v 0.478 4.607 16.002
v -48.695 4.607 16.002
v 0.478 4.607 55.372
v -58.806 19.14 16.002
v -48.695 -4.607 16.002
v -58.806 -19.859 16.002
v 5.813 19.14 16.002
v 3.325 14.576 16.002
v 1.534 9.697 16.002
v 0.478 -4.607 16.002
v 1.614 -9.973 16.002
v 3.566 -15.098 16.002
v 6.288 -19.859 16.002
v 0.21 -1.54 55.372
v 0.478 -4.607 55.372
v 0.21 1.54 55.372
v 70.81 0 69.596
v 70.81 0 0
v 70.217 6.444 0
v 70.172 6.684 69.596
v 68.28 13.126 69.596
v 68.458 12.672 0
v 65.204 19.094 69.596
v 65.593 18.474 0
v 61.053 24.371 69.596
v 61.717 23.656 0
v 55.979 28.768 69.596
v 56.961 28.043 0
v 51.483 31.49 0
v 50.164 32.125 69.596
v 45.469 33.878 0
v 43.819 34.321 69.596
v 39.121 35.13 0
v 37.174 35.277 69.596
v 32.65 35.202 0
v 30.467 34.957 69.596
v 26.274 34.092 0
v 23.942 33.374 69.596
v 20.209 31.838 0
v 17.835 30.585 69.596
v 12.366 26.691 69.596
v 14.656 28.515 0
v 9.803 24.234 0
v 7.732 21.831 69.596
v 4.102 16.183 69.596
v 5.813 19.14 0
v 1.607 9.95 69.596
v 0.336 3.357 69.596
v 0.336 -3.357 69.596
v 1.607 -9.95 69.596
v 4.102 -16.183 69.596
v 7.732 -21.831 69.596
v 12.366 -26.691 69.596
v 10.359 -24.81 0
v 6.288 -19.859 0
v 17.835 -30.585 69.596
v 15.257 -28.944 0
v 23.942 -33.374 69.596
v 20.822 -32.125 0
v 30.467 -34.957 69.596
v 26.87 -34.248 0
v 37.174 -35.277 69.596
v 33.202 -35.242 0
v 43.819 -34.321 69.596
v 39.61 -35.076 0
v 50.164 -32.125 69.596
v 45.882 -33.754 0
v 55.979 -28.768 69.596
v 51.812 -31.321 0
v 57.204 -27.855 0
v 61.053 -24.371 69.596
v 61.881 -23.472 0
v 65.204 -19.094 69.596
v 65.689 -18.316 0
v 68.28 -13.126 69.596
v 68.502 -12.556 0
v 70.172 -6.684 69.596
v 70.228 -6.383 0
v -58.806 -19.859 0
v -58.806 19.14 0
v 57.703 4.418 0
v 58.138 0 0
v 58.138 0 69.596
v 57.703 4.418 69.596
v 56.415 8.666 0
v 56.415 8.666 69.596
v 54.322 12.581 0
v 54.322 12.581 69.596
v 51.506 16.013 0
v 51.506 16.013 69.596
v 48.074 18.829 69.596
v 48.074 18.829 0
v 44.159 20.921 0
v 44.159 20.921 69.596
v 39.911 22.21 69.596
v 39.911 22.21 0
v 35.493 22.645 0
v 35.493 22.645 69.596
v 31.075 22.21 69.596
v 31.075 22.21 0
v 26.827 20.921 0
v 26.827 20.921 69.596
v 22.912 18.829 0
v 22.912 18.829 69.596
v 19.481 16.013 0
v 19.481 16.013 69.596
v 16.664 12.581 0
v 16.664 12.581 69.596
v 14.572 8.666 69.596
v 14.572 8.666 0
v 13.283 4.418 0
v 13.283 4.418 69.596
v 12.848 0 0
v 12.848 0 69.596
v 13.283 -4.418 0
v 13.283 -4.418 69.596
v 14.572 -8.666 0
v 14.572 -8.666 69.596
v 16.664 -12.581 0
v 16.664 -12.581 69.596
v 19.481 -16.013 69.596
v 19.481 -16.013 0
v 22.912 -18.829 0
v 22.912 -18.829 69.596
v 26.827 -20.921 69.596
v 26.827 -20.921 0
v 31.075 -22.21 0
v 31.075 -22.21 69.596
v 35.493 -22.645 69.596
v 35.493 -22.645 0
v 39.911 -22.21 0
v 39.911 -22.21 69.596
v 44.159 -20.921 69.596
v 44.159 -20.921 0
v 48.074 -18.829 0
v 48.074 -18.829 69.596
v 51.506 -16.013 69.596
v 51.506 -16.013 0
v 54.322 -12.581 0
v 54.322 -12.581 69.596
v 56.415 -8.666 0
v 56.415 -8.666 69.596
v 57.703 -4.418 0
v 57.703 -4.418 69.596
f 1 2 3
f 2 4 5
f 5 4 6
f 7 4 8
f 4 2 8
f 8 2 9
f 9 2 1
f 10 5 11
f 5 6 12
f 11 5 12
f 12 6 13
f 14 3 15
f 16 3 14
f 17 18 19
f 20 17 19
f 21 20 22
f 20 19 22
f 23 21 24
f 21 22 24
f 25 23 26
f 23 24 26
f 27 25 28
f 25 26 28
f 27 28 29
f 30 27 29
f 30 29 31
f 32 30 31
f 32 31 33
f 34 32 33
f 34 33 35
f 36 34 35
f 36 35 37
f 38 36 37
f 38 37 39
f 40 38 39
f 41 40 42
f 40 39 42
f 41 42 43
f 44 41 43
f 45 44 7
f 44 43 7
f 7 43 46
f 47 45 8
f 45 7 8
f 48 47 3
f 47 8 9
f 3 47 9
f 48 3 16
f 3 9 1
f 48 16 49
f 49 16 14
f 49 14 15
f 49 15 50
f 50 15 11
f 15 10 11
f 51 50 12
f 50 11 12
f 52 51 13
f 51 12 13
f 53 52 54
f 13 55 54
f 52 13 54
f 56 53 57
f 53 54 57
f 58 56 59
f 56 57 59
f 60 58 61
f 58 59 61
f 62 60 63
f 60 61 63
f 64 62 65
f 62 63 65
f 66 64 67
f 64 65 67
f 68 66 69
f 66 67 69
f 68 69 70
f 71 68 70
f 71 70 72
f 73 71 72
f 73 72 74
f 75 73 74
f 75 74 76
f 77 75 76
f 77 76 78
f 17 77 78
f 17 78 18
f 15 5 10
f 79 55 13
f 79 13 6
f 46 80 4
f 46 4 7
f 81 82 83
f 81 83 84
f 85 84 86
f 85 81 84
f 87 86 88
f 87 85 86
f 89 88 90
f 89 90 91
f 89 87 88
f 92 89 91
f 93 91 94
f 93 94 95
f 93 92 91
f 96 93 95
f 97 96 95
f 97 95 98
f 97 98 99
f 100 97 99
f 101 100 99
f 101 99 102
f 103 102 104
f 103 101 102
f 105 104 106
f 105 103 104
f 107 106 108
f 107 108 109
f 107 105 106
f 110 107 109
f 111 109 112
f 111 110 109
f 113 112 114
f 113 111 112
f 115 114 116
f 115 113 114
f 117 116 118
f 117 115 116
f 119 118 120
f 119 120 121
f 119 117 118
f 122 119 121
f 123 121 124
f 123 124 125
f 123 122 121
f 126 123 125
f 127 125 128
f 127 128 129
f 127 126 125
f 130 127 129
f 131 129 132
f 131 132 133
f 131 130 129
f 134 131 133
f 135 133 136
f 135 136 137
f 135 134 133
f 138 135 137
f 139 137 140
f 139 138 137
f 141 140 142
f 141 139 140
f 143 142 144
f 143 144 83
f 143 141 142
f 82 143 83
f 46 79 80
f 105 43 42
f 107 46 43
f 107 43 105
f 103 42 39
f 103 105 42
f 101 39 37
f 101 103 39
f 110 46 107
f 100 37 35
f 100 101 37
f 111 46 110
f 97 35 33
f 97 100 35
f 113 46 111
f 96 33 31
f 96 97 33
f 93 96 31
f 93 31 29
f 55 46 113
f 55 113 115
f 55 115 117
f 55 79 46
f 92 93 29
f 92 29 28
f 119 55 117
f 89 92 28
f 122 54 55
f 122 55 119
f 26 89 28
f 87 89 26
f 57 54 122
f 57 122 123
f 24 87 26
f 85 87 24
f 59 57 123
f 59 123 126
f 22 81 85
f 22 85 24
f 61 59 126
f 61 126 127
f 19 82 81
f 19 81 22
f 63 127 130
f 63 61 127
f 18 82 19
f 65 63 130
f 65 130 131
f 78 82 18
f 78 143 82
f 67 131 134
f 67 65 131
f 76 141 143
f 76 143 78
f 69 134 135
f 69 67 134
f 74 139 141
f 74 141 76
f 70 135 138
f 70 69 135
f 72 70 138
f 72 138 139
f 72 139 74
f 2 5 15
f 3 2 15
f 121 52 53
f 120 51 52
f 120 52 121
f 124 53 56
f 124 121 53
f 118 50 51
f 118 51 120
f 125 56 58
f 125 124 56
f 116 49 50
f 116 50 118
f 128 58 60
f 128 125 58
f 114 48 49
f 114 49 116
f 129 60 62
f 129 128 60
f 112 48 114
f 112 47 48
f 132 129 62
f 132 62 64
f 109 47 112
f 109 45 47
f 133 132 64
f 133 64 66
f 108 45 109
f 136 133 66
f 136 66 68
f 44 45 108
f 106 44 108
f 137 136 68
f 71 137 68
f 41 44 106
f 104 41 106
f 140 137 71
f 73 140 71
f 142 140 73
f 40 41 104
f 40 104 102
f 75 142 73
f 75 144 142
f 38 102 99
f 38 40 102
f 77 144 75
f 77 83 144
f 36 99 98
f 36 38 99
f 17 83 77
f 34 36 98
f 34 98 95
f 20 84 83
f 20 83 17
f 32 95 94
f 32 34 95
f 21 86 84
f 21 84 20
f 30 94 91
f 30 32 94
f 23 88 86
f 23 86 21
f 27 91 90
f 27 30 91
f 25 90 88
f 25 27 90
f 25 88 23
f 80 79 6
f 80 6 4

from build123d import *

# Parameters (mm, degrees)
F0_R     = 35.316834
F0_R_2   = 22.645268
F1_DEPTH = 69.596
F3_DEPTH = 16.002
F4_W     = 31.616599
F4_H     = 9.21494
F5_DEPTH = 55.372
F6_W     = 26.249159
F6_H     = 9.21494
F7_DEPTH = 39.37
F9_DEPTH = 38.1


with BuildPart() as f1:
    # F0 (on Top) → F1 (new body)
    with BuildSketch(Plane.XY):
        with Locations((35.493162, 0)):
            Circle(F0_R)
        with Locations((35.493162, 0)):
            Circle(F0_R_2, mode=Mode.SUBTRACT)
    extrude(amount=F1_DEPTH)

    # F2 (on face) → F3 (join)
    with BuildSketch(Plane(origin=(0, 0, 0), x_dir=(1, 0, 0), z_dir=(0, 0, -1))):
        with BuildLine():
            Line((-58.806233, -19.13999), (5.812536, -19.13999))
            ThreePointArc((5.812536, -19.13999), (0.178957, 0.430922), (6.288416, 19.858539))
            Line((6.288416, 19.858539), (-58.806233, 19.858539))
            Line((-58.806233, 19.858539), (-58.806233, -19.13999))
        make_face()
    extrude(amount=-F3_DEPTH)

    # F4 (on face) → F5 (join)
    with BuildSketch(Plane(origin=(0, 0, 0), x_dir=(1, 0, 0), z_dir=(0, 0, -1))):
        with Locations((-6.637758, 0)):
            Rectangle(F4_W, F4_H)
    extrude(amount=-F5_DEPTH)

    # F6 (on face) → F7 (join)
    with BuildSketch(Plane.XY.offset(16.002)):
        with Locations((-35.570636, 0)):
            Rectangle(F6_W, F6_H)
    extrude(amount=F7_DEPTH)

    # F8 (on face) → F9 (cut)
    with BuildSketch(Plane.XZ.offset(4.60747)):
        Polygon((-48.695216, 16.002), (0.478165, 55.372), (-48.695216, 55.372), align=None)
    extrude(amount=-F9_DEPTH, mode=Mode.SUBTRACT)


solid = f1.part
